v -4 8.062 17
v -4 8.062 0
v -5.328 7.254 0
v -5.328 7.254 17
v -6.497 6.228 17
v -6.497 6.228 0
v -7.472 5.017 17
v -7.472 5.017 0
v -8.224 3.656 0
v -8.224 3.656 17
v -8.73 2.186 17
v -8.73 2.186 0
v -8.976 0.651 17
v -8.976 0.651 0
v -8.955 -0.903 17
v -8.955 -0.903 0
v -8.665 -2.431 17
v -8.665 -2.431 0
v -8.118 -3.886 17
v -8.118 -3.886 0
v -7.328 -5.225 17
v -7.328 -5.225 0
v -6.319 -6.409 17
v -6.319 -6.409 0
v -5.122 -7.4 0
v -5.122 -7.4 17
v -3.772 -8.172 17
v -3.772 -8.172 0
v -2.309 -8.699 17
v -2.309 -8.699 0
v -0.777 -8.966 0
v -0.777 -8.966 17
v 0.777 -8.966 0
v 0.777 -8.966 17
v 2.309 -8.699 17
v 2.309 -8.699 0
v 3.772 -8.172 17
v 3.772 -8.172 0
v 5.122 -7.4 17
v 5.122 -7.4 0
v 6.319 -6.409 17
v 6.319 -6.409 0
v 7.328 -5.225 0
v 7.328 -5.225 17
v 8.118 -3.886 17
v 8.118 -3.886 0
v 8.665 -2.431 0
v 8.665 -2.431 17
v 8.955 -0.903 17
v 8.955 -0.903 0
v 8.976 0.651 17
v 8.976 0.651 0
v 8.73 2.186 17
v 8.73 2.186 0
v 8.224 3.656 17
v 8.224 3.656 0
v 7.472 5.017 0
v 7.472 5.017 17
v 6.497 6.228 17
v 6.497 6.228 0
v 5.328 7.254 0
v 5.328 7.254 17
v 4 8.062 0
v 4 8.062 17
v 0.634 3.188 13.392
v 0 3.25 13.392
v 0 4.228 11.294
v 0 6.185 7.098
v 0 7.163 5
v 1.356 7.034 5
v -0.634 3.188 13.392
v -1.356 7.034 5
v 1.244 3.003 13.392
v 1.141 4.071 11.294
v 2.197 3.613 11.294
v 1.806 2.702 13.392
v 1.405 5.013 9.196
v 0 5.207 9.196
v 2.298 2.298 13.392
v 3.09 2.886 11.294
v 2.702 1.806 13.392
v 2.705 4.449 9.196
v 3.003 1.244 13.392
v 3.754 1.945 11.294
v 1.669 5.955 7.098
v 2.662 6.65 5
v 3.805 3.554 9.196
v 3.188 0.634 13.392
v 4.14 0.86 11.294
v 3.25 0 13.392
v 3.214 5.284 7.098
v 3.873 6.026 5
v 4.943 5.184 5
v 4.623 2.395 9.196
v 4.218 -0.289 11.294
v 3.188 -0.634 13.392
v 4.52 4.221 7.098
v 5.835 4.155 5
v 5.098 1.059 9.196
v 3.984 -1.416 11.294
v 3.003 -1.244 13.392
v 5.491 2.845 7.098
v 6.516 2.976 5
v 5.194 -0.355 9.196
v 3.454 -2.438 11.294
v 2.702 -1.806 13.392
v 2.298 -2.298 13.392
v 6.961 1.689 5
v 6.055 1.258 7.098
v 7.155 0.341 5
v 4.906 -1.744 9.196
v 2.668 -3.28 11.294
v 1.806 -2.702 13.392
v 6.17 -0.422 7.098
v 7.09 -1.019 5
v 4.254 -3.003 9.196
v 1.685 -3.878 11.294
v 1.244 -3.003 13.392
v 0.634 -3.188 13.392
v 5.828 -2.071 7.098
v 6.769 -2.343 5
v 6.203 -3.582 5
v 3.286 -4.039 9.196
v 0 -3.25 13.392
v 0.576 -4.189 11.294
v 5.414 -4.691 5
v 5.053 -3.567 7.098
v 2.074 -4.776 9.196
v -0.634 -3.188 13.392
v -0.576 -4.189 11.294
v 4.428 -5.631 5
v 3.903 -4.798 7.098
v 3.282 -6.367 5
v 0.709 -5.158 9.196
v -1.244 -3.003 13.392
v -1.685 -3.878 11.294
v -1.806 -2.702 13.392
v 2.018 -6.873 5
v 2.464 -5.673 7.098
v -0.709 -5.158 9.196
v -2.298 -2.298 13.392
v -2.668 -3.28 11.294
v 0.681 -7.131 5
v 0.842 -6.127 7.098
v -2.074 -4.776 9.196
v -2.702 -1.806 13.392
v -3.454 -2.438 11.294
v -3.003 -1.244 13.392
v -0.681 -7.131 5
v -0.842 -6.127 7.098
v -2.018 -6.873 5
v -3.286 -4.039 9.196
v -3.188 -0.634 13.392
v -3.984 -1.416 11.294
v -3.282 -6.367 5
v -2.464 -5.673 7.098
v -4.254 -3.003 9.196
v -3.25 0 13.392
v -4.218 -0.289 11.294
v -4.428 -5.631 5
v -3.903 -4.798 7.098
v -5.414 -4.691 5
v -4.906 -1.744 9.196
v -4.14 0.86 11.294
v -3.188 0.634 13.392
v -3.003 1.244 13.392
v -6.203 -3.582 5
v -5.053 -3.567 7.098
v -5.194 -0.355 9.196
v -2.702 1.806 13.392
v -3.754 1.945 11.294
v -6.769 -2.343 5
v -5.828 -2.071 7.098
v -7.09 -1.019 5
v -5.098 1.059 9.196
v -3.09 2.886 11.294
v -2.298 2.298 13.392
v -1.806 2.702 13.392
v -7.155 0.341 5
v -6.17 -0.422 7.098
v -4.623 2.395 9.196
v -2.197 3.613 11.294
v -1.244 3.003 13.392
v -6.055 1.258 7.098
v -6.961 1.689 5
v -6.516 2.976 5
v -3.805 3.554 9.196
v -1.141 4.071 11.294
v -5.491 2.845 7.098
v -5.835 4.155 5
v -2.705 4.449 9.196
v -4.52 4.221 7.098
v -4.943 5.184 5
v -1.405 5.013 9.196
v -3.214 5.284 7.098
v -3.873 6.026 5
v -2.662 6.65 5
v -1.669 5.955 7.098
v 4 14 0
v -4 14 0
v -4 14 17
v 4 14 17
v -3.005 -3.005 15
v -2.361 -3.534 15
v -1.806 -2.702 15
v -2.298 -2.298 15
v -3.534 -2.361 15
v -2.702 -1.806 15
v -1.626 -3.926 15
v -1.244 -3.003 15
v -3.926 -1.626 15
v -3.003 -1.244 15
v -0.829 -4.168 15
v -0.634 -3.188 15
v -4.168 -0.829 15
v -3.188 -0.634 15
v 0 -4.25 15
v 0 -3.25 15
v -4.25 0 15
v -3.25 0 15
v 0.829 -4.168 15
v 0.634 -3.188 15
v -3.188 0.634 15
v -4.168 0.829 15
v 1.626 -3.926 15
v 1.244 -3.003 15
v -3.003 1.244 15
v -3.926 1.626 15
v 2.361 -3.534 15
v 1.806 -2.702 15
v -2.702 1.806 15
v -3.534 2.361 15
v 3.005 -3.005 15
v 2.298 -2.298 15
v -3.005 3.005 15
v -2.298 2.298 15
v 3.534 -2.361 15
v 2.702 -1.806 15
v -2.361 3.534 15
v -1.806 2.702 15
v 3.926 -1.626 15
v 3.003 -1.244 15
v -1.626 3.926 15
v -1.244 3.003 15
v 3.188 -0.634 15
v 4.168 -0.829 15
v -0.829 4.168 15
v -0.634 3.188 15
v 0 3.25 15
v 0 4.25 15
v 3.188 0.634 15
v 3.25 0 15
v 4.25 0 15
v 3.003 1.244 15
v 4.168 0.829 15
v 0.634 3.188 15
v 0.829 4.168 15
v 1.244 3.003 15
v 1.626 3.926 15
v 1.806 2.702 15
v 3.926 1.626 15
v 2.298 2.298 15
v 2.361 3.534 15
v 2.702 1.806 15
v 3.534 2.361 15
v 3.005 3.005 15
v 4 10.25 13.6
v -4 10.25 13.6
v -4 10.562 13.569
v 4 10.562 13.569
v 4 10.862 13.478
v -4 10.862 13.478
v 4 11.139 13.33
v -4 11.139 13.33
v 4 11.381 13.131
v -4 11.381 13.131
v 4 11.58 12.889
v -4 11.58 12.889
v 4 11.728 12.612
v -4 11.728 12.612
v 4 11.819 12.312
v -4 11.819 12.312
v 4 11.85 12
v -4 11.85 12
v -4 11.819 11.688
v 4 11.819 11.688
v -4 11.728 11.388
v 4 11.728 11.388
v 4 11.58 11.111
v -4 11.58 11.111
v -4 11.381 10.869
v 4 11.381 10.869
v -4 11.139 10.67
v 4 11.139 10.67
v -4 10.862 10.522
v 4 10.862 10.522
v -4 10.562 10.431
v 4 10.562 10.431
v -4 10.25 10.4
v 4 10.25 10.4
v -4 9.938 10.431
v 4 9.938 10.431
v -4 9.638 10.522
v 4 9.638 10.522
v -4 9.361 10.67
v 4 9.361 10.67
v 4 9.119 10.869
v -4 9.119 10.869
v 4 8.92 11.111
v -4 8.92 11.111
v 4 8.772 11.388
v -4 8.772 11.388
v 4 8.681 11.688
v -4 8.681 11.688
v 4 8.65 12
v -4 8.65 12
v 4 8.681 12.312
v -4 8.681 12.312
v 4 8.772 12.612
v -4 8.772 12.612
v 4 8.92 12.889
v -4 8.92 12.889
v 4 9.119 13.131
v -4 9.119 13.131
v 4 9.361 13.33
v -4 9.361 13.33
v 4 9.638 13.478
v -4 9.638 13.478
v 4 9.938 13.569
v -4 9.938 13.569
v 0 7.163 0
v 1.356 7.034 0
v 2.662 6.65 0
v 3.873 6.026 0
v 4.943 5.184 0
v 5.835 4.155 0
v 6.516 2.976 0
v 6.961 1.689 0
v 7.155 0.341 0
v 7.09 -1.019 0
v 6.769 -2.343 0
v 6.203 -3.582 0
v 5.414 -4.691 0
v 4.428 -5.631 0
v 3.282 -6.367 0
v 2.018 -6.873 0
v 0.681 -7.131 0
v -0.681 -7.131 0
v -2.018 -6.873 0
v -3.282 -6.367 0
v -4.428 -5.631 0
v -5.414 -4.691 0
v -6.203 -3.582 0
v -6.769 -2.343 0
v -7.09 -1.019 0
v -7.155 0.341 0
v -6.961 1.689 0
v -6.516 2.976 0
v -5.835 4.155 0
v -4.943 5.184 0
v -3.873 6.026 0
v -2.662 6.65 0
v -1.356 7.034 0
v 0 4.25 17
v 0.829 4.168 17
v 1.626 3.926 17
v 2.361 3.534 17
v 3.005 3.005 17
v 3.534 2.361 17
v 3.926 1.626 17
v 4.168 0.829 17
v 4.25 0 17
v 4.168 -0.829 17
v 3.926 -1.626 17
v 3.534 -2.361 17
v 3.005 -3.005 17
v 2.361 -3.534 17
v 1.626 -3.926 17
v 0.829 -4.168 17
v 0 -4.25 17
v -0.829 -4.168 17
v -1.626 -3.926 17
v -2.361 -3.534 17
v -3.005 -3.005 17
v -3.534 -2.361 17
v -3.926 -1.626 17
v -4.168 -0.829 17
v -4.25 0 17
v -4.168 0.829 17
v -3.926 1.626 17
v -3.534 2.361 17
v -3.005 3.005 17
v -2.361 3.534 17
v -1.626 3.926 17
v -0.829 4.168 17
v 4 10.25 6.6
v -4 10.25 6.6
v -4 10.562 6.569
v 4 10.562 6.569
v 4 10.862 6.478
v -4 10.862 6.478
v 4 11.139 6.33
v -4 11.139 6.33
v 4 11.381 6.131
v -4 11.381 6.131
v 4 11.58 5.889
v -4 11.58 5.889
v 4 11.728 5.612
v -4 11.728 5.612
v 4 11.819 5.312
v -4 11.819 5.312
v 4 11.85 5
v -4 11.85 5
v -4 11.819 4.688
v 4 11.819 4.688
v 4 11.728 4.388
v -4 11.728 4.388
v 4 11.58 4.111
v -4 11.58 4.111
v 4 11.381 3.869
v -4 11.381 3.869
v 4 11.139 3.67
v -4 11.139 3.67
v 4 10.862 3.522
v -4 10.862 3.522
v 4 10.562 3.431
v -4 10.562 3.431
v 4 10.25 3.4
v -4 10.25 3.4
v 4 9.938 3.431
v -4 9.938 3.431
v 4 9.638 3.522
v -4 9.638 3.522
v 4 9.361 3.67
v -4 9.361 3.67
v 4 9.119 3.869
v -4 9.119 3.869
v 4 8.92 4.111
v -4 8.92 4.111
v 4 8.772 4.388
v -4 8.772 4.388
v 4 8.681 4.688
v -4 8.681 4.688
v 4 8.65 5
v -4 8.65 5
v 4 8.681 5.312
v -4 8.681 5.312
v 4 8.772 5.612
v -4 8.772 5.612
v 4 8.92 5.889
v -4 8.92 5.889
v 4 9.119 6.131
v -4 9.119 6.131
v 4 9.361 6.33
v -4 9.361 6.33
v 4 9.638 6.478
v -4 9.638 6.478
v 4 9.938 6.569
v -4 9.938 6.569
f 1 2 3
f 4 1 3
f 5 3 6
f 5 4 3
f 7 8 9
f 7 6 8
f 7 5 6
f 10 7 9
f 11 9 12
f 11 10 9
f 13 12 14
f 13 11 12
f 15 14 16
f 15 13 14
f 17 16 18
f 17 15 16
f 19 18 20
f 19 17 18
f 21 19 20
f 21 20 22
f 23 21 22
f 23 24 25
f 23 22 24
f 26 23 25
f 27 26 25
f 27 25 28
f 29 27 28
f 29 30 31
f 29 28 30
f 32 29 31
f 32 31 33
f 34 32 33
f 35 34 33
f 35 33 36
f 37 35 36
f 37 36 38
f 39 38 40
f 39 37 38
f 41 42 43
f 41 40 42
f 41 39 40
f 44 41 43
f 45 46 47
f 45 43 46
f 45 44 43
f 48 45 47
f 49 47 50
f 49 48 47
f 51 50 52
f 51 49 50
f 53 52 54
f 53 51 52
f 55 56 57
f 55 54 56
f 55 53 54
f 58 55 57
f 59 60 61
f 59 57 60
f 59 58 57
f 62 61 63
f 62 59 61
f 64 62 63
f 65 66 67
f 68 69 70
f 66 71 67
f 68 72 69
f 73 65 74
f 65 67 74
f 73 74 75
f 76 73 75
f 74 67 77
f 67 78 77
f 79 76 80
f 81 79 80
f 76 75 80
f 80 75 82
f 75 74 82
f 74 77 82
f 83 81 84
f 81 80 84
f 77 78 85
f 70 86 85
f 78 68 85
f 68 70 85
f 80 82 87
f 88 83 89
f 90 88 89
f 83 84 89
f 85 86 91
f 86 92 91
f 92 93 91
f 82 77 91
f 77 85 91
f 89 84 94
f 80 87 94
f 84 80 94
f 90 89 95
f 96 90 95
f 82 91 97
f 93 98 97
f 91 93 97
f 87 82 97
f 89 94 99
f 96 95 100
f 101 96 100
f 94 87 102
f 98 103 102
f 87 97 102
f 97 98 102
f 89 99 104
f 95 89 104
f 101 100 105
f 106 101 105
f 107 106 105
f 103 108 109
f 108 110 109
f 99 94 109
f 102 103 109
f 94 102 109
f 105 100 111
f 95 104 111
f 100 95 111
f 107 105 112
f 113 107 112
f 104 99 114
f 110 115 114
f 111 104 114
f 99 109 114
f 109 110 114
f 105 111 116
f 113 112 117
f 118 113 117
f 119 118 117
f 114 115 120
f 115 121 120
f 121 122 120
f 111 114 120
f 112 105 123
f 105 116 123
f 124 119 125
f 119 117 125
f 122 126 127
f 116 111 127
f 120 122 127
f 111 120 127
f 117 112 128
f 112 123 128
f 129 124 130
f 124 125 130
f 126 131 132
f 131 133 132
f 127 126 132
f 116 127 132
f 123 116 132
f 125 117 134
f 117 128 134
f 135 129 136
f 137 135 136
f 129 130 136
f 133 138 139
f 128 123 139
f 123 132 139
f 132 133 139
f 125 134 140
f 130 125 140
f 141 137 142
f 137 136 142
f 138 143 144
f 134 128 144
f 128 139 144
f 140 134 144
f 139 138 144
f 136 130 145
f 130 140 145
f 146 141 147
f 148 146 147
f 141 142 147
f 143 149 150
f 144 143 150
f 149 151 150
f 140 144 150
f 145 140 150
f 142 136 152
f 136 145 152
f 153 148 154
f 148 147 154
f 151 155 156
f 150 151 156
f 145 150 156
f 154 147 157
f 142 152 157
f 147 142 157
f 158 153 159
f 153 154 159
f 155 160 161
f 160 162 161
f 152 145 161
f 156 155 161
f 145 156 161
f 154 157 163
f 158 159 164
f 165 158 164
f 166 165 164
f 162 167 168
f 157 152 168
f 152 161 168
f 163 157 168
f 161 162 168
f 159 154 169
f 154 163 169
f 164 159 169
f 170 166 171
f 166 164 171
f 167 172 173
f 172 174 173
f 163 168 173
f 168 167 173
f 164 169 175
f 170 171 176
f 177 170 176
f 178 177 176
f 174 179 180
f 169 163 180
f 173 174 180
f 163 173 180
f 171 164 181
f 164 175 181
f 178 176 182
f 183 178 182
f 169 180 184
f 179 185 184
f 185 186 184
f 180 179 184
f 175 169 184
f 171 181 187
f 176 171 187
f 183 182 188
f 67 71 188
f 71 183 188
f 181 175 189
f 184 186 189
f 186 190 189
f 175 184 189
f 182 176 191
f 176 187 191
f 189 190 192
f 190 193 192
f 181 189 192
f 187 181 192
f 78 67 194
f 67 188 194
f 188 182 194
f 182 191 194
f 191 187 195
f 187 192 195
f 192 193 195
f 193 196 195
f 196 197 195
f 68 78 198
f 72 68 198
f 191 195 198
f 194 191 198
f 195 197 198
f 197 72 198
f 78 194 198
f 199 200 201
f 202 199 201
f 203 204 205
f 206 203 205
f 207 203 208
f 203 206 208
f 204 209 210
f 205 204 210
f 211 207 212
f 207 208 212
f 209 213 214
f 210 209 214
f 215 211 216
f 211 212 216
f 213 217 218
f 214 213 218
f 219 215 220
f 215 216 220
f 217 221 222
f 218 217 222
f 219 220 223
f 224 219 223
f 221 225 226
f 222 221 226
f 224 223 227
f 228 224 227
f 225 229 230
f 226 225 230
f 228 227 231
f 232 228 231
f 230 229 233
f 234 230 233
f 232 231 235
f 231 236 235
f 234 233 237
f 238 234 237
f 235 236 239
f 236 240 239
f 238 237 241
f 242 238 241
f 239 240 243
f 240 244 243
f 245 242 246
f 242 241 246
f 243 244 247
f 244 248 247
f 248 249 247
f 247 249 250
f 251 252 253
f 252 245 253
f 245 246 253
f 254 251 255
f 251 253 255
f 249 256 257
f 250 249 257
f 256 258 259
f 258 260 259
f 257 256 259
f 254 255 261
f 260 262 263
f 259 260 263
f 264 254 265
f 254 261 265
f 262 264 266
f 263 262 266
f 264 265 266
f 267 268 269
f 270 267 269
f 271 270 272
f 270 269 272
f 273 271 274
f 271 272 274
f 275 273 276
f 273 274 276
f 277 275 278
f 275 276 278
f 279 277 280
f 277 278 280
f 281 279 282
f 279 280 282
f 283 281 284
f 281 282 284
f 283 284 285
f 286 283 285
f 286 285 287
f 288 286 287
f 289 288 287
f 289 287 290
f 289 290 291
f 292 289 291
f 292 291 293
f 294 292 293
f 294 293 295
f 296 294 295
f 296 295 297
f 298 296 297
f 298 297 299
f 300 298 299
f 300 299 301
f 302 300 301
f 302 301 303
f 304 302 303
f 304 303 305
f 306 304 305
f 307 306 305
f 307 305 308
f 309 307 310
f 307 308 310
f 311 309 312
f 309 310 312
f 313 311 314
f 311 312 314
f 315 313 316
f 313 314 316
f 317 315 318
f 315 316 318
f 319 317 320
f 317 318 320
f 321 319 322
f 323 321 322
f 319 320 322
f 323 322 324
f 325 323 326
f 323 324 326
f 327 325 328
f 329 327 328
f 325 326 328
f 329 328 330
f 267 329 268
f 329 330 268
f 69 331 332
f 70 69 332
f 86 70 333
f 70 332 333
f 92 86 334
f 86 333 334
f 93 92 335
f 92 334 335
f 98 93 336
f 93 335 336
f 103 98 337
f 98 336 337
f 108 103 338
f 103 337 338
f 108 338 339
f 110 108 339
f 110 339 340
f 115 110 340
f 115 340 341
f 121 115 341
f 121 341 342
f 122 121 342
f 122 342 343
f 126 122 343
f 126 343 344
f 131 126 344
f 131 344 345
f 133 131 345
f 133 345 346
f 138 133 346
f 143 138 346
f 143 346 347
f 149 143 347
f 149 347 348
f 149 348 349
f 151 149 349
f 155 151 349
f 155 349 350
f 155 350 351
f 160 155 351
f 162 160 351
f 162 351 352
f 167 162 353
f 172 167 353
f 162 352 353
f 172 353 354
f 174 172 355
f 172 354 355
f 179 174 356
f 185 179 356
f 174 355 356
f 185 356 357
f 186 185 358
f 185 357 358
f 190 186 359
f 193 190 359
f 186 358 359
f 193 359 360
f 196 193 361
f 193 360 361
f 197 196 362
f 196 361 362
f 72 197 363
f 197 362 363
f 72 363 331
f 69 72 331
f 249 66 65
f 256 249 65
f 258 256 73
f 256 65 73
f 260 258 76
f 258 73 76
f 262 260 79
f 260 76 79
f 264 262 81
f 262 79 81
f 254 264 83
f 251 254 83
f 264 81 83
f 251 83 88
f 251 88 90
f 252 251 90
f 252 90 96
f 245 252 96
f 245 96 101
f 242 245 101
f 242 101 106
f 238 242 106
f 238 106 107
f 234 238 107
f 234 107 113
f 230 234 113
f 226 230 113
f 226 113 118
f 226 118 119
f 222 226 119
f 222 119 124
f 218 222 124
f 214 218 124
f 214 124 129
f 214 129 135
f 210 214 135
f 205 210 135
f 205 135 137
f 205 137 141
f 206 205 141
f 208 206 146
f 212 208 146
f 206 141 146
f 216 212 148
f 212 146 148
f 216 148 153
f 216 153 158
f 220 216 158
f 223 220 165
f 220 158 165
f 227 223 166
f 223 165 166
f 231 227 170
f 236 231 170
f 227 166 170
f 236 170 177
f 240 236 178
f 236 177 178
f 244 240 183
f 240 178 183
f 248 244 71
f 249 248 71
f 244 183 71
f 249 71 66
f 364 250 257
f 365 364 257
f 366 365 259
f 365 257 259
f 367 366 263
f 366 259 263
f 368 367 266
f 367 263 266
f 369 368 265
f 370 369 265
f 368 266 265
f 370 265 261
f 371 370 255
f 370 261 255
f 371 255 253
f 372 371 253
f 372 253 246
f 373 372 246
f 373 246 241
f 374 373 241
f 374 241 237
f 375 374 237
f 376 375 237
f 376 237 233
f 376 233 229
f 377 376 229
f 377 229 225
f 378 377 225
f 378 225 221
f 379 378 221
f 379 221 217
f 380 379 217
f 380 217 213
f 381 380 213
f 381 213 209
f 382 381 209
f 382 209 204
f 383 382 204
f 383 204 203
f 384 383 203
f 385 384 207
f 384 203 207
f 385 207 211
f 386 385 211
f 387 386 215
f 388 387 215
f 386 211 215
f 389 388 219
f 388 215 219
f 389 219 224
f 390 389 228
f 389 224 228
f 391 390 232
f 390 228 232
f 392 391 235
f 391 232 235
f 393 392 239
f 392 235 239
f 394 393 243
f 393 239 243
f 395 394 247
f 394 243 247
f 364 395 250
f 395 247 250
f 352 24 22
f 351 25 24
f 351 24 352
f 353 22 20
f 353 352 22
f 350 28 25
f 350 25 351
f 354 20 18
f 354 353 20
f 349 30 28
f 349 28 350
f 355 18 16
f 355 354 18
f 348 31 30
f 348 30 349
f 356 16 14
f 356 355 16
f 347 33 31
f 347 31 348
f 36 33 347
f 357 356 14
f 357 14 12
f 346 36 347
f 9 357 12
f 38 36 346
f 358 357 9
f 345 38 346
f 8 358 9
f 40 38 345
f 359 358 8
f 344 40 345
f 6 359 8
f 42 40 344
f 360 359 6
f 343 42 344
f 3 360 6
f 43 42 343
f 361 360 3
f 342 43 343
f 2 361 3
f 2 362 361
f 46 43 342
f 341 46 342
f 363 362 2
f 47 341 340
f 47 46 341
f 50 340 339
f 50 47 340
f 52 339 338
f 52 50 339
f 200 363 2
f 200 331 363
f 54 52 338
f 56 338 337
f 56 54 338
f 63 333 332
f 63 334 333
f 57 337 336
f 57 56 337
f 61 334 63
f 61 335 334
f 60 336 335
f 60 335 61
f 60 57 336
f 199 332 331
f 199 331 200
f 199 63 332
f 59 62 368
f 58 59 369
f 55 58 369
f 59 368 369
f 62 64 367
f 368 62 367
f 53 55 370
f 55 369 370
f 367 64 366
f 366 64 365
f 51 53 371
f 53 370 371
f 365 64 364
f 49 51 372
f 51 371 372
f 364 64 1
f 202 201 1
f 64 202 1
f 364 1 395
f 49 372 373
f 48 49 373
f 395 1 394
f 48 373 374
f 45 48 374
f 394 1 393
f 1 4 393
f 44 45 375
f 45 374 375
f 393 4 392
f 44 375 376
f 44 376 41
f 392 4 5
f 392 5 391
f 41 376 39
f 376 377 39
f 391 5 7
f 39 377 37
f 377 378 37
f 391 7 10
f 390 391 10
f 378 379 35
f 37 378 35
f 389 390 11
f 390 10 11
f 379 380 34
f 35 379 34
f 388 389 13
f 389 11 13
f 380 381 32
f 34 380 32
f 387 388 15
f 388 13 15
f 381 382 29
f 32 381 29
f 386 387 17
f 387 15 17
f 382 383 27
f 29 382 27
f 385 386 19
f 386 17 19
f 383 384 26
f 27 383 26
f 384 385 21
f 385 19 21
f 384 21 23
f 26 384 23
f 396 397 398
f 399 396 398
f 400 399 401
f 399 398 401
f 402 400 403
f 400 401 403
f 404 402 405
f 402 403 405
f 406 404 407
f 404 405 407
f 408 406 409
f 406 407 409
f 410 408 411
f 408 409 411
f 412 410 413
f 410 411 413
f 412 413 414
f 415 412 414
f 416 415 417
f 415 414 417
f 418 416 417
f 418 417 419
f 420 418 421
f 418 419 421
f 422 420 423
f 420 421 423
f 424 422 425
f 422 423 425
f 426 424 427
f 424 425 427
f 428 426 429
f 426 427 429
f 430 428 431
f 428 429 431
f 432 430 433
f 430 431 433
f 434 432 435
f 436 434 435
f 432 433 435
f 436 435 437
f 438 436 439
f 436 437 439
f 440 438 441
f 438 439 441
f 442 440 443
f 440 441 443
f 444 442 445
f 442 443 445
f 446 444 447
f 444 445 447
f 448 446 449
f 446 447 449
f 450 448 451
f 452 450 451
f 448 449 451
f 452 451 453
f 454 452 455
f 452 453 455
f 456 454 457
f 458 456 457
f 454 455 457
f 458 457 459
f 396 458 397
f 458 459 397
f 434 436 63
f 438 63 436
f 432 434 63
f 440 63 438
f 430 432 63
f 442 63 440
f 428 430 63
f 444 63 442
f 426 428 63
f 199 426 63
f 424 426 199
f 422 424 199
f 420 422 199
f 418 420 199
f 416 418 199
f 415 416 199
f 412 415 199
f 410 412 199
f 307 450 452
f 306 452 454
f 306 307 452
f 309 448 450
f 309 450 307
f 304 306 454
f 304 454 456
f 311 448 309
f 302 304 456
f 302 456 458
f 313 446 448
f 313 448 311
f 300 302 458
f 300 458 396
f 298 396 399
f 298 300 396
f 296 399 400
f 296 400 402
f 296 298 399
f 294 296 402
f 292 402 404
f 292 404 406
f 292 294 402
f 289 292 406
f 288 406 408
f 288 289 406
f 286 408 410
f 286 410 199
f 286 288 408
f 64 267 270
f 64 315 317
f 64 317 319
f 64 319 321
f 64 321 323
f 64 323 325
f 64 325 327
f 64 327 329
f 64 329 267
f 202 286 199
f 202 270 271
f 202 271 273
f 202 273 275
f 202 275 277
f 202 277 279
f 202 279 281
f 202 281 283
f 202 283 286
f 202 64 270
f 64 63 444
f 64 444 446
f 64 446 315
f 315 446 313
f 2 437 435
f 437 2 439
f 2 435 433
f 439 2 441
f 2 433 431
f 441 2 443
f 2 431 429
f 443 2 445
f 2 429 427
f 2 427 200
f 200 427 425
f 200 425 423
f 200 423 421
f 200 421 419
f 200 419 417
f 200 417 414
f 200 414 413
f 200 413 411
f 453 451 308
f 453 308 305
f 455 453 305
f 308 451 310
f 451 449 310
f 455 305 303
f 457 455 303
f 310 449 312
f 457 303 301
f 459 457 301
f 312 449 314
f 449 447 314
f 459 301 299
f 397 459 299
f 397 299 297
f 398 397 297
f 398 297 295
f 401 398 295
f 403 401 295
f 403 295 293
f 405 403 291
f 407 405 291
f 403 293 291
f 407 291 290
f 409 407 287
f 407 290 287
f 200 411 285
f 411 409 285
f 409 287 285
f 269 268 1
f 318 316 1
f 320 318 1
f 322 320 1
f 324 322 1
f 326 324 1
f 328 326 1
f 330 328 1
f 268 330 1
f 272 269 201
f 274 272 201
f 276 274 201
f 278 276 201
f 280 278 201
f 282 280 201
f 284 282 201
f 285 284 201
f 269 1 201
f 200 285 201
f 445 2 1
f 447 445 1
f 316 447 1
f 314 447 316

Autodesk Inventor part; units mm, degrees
ref_plane "YZ Plane" through (0, 0, 0) normal (1, 0, 0) x (0, 1, 0)
ref_plane "XZ Plane" through (0, 0, 0) normal (0, 1, 0) x (-1, 0, 0)
ref_plane "XY Plane" through (0, 0, 0) normal (0, 0, 1) x (1, 0, 0)
sketch "Sketch1" plane through (0, 0, 0) normal (1, 0, 0) x (0, 1, 0)
  line L0 (0, 15) -> (2.5, 15) construction
  line L1 (0, 0) -> (9.4946, 0) construction
  arc A0 (9.4946, 0) -> (2.5, 15) centre (-10.0865, 0) ccw construction
  line L2 (0, 9.5) -> (0, 0) construction
  line L3 (9.4946, 0) -> (9, 0) construction
  line L4 (9, 0) -> (9, 15)
  line L5 (9, 15) -> (9, 15)
  line L6 (9, 15) -> (9, 17)
  line L7 (9, 17) -> (4.25, 17)
  line L8 (4.25, 17) -> (4.25, 15)
  line L9 (2.5, 15) -> (4.25, 15) construction
  line L10 (2.5, 15) -> (9.4946, 0) construction
  line L11 (3.25, 15) -> (3.25, 13.3916)
  line L12 (3.25, 15) -> (4.25, 15)
  line L13 (7.1631, 5) -> (7.1631, 0)
  line L14 (7.1631, 0) -> (9, 0)
  line L15 (7.1631, 5) -> (3.25, 13.3916)
  point P0 (2.25, 0)
  dimension "d2" = 15
  dimension "d12" = 2
  dimension "d14" = 0
  dimension "d16" = 2
  dimension "d17" = 4.25
  dimension "d35" = 115
  dimension "d36" = 9
  dimension "d37" = 2.5
  dimension "d39" = 1
  dimension "d40" = 5
  dimension "d41" = 7.1631
  dimension "d42" = 3.25
  dimension "d43" = 1.6084
  dimension "d44" = 8.3916
revolve "Revolution1" add sketch "Sketch1" angle 360 about axis through (0, 0, 9.5) along (0, 0, -1)
sketch "Sketch3" plane through (0, 0, 0) normal (1, 0, 0) x (0, 1, 0)
  line L0 (7.1631, 0) -> (14, 0)
  line L1 (14, 0) -> (14, 17)
  line L2 (14, 17) -> (7.1631, 17)
  line L3 (7.1631, 17) -> (7.1631, 0)
  line L4 (-7.1631, 0) -> (7.1631, 0) construction
  line L5 (-9, 17) -> (9, 17) construction
  point P0 (0, 0)
  dimension "d28" = 14
extrude "Extrusion1" add sketch "Sketch3" along normal mid plane 8
sketch "Sketch4" plane through (-4, 0, 0) normal (-1, 0, 0) x (0, 0, 1)
  circle A0 centre (5, 10.25) radius 1.6
  circle A1 centre (12, 10.25) radius 1.6
  line L0 (5, 10.25) -> (12, 10.25) construction
  line L1 (17, 14) -> (0, 14) construction
  point P0 (0, 0)
  point P1 (17, 10.25)
  point P2 (8.5, 10.25)
  point P3 (8.5, 14)
  dimension "d29" = 3.2
  dimension "d30" = 3.2
  dimension "d31" = 7
  dimension "d34" = 3.75
extrude "Extrusion2" cut sketch "Sketch4" against normal blind 10
properties part number "brush holder"
